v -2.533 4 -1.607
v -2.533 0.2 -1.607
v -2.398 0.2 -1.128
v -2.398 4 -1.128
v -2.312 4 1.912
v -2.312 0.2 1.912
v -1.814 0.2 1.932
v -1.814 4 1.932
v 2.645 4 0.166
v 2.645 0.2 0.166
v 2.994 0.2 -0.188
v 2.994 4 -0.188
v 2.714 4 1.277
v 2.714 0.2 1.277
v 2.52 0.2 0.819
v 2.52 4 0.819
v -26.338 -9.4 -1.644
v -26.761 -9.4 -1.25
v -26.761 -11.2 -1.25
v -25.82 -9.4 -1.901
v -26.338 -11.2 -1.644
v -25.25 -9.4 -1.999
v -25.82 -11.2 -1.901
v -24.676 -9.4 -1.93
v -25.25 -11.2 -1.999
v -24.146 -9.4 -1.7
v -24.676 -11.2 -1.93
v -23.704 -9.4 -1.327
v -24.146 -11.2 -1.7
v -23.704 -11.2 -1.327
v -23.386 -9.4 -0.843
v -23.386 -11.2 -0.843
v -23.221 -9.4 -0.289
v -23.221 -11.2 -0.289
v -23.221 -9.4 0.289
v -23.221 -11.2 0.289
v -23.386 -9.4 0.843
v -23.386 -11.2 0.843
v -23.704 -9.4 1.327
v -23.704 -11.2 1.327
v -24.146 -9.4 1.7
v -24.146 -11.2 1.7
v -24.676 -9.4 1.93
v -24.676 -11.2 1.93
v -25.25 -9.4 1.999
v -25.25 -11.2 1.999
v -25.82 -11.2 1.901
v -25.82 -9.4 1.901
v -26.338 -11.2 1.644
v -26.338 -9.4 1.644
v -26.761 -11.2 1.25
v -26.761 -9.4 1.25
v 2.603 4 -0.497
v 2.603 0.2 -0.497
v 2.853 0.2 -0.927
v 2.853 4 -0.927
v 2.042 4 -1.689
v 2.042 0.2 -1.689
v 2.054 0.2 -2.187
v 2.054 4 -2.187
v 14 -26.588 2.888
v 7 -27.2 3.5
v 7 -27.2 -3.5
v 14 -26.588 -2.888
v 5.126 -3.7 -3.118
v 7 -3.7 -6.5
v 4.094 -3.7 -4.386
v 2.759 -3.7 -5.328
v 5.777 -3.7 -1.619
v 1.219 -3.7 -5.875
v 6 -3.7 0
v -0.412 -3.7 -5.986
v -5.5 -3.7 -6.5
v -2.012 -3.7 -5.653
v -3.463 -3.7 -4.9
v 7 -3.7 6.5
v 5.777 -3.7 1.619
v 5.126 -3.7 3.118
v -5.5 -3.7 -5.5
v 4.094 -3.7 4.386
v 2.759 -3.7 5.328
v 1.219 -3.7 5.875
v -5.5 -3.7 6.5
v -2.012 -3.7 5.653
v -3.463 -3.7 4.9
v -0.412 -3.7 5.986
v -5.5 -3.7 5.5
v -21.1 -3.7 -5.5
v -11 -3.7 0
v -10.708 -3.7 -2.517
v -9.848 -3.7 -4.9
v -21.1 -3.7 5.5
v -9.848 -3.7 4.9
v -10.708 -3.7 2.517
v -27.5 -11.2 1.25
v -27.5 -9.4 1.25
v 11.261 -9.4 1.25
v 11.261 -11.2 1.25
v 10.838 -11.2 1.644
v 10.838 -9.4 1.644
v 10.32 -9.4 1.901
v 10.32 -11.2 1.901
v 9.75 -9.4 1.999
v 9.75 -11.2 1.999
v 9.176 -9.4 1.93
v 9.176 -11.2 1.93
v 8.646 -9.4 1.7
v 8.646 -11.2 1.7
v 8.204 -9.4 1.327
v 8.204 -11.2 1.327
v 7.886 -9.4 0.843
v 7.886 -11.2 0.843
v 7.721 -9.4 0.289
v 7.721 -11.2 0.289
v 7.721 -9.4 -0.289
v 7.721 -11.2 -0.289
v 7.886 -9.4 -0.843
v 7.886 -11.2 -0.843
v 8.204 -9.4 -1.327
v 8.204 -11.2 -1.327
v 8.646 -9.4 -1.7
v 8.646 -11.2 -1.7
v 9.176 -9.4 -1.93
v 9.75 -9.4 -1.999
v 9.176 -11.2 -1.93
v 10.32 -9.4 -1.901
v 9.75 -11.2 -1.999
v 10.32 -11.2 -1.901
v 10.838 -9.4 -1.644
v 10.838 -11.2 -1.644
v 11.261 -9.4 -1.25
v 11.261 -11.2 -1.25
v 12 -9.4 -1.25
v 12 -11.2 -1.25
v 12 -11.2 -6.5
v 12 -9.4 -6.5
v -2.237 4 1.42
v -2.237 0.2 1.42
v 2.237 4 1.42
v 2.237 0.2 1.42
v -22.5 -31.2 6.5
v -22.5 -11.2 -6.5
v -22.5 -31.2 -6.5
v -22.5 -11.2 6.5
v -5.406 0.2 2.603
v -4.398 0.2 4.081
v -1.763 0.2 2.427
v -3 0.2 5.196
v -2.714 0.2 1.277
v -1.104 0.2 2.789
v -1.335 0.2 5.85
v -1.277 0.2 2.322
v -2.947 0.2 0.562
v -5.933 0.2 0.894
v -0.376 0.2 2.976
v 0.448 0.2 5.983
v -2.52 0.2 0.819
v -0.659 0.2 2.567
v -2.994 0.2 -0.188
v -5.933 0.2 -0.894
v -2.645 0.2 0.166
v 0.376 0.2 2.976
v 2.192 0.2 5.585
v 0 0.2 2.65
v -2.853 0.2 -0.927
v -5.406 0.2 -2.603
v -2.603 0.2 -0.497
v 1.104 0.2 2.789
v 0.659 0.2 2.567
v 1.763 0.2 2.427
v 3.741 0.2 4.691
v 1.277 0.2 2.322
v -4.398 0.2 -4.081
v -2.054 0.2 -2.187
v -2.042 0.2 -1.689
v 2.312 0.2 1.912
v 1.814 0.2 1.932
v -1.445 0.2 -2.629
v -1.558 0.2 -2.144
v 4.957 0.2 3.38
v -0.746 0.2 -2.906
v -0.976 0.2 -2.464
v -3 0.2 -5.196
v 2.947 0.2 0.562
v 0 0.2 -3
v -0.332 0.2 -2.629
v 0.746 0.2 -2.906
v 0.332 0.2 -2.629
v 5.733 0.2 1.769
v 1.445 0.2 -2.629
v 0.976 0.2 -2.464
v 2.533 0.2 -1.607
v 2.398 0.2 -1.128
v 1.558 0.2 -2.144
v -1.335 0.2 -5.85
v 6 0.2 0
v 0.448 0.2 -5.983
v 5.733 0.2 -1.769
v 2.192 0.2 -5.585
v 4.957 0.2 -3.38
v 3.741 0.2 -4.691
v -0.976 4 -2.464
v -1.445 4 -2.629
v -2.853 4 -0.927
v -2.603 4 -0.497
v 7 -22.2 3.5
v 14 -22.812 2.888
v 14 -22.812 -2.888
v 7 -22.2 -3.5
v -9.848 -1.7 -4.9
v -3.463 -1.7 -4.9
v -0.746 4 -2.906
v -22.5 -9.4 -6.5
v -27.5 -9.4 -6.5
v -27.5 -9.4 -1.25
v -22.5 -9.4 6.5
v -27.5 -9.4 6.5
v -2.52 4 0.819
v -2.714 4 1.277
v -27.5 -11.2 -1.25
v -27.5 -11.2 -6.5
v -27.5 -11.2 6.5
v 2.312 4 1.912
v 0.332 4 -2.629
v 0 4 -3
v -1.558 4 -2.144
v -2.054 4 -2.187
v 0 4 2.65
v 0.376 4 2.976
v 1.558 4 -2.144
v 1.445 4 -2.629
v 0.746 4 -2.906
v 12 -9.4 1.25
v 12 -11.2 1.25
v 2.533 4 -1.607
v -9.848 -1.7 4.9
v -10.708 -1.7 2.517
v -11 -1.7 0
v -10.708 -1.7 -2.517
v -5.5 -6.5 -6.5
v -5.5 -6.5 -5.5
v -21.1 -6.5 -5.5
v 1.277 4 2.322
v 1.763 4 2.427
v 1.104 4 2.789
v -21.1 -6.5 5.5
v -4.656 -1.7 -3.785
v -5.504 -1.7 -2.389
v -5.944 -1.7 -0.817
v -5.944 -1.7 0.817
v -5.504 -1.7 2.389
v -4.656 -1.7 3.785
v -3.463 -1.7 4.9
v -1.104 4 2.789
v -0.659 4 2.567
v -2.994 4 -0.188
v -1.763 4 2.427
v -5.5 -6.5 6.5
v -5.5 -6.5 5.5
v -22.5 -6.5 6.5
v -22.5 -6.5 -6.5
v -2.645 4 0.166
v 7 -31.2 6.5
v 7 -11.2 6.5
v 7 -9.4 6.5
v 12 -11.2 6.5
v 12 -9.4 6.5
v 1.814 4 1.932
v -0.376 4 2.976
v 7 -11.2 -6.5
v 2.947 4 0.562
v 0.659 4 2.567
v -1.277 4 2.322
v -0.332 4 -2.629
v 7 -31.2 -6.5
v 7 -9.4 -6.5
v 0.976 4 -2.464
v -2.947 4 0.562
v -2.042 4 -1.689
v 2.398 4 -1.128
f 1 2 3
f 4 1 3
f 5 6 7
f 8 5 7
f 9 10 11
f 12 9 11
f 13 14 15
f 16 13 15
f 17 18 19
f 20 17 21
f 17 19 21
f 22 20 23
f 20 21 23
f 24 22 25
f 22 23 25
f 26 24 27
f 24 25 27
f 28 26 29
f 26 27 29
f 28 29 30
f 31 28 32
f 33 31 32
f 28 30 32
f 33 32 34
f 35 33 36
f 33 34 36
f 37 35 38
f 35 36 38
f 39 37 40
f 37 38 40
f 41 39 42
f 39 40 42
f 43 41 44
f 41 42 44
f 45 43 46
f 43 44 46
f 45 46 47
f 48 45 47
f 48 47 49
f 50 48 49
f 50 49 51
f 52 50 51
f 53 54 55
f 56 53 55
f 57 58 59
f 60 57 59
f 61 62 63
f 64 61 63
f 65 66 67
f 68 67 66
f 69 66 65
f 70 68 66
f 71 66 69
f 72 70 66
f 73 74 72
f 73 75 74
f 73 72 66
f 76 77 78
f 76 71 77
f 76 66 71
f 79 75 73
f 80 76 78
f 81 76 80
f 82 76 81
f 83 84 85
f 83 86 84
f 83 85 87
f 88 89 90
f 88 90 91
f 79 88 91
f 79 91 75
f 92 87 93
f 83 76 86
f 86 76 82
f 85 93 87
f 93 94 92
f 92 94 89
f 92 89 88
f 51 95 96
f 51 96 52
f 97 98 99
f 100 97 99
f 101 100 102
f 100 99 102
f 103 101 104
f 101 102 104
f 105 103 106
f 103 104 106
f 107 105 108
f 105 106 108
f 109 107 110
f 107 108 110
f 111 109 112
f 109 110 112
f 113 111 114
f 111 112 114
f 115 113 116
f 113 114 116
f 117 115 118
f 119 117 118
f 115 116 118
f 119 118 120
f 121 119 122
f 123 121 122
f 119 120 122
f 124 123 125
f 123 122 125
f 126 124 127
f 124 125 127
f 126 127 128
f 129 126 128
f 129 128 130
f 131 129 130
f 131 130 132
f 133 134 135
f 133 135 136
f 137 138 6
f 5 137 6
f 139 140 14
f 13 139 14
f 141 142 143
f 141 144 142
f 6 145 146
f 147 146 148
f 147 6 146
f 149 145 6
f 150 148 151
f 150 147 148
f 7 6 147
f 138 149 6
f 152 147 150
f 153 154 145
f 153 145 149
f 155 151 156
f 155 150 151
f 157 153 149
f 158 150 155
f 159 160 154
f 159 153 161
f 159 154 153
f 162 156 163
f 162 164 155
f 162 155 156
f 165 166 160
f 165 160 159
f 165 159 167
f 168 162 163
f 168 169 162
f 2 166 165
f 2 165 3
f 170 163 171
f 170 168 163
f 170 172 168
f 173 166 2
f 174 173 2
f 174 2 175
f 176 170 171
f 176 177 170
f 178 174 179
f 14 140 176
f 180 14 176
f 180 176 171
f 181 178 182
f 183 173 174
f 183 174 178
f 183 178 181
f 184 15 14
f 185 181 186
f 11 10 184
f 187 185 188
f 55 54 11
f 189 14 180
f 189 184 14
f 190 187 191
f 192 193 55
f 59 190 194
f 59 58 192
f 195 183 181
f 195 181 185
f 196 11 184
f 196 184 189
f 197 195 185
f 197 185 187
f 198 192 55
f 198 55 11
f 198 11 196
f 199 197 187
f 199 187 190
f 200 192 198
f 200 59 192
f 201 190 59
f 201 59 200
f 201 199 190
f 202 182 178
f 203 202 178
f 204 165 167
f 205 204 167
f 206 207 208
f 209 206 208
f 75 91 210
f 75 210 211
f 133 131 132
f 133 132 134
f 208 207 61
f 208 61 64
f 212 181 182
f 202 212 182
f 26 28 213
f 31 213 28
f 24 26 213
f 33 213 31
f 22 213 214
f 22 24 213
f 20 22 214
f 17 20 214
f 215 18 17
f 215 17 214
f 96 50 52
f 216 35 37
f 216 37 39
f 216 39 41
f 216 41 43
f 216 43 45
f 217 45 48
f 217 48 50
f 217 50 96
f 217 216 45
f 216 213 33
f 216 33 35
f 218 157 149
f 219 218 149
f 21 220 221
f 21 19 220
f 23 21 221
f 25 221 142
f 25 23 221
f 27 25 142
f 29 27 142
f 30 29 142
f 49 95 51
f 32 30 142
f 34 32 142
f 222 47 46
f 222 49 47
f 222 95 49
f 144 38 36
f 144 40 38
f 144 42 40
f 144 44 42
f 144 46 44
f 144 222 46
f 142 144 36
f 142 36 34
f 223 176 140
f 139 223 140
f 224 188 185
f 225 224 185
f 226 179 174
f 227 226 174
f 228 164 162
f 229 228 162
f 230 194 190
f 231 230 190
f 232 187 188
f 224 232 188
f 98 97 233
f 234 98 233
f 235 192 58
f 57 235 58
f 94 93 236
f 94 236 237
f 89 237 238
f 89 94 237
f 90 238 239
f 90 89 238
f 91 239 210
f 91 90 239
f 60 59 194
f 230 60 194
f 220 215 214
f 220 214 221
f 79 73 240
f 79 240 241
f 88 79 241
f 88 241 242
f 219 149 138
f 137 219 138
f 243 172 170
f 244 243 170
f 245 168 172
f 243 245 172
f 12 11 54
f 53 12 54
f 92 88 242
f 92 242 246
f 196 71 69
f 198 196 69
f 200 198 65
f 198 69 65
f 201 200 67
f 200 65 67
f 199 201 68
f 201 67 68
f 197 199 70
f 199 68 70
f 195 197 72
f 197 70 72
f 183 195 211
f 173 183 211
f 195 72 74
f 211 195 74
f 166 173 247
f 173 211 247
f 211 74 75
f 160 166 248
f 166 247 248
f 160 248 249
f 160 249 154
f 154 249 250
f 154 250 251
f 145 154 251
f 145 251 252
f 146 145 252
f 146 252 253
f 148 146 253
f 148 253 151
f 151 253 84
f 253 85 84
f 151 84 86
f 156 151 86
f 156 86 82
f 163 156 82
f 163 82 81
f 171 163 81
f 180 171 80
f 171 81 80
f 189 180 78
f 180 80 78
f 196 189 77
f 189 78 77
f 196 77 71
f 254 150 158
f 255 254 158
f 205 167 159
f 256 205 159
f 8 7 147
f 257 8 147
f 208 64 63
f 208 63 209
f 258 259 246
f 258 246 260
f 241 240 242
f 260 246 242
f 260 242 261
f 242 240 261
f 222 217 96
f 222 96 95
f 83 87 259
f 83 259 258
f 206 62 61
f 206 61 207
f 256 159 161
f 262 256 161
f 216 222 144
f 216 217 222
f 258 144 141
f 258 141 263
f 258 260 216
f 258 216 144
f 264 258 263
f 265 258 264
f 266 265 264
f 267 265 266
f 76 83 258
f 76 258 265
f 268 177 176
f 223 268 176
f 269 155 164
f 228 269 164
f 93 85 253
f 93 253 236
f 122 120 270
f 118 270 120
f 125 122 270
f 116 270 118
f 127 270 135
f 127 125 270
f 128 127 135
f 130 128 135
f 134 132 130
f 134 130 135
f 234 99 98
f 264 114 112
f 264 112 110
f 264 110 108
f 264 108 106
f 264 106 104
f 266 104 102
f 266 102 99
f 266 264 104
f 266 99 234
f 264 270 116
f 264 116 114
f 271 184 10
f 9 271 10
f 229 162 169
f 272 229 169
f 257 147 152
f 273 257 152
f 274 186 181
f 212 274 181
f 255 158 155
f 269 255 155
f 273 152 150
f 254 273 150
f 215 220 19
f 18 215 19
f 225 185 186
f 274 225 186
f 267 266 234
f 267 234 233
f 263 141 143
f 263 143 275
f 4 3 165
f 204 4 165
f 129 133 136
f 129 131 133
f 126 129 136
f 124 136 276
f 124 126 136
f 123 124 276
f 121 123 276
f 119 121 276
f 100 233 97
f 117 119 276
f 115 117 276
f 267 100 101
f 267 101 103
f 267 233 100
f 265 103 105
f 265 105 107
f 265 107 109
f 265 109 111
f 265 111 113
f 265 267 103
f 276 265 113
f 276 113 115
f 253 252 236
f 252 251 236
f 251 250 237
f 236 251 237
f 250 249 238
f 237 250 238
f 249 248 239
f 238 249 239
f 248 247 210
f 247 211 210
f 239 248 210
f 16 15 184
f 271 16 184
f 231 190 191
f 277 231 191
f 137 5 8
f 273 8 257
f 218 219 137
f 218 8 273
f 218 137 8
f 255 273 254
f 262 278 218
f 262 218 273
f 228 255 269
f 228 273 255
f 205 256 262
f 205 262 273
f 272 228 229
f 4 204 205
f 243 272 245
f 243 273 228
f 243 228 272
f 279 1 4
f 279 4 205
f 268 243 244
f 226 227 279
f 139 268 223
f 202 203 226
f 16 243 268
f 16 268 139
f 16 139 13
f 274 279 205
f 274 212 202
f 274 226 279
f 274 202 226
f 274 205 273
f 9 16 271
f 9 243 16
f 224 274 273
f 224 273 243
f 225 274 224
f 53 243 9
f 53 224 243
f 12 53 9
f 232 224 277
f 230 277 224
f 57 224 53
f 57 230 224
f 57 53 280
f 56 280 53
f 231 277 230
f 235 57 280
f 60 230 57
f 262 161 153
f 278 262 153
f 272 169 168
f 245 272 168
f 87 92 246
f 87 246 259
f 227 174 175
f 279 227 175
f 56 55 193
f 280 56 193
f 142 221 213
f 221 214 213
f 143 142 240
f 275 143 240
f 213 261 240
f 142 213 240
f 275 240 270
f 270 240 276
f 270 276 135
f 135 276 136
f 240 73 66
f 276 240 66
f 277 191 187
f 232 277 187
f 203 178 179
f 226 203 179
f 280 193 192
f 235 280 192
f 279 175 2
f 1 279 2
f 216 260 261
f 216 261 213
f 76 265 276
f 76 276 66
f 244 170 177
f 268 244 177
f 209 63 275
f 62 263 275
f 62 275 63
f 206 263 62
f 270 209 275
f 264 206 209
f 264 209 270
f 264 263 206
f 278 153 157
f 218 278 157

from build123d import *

# Parameters (mm, degrees)
BOSS_EXTRU_1_DEPTH            = 6.5
BOSS_EXTRU_1_DEPTH_BACK       = 6.5
ENL_V_MAT_EXTRU_1_DEPTH       = 2.8
ESQUISSE3_R                   = 6
BOSS_EXTRU_2_DEPTH            = 3.9
BOSS_EXTRU_3_DEPTH            = 3.8
BOSS_EXTRU_4_DEPTH            = 2
DIAM_TRE_DU_PER_AGE_4_0_4_1_D = 4
DIAM_TRE_DU_PER_AGE_4_0_4_2_D = 4
ESQUISSE10_W                  = 7
ESQUISSE10_H                  = 5
BOSS_EXTRU_5_DEPTH            = 7
D_POUILLE1_ANGLE              = 5
ESQUISSE11_W                  = 2
ESQUISSE11_H                  = 2.5
ENL_V_MAT_EXTRU_2_DEPTH       = 36.689494253
ENL_V_MAT_EXTRU_3_REACH       = 37.689
ESQUISSE12_W                  = 2
ESQUISSE12_H                  = 2.5


with BuildPart() as part:
    # Esquisse1 → Boss.-Extru.1 (new, two sides: drawn at the far end of the back side and taken through both)
    with BuildSketch(Plane.XY.offset(-BOSS_EXTRU_1_DEPTH_BACK)):
        Polygon((-22.5, -11.2), (-22.5, -31.2), (7, -31.2), (7, -11.2), (12, -11.2), (12, -9.4), (7, -9.4), (7, -3.7), (-22.5, -3.7), (-22.5, -9.4), (-27.5, -9.4), (-27.5, -11.2), align=None)
    extrude(amount=BOSS_EXTRU_1_DEPTH + BOSS_EXTRU_1_DEPTH_BACK)

    # Esquisse2 → Enlèv. mat.-Extru.1 (cut)
    with BuildSketch(Plane(origin=(0, -3.7, 0), x_dir=(1, 0, 0), z_dir=(0, 1, 0))):
        Polygon((-5.5, 6.5), (-5.5, 5.5), (-21.1, 5.5), (-21.1, -5.5), (-5.5, -5.5), (-5.5, -6.5), (-22.5, -6.5), (-22.5, 6.5), align=None)
    extrude(amount=-ENL_V_MAT_EXTRU_1_DEPTH, mode=Mode.SUBTRACT)

    # Esquisse3 → Boss.-Extru.2 (add)
    with BuildSketch(Plane(origin=(0, -3.7, 0), x_dir=(1, 0, 0), z_dir=(0, 1, 0))):
        Circle(ESQUISSE3_R)
    extrude(amount=BOSS_EXTRU_2_DEPTH)

    # Esquisse4 → Boss.-Extru.3 (add)
    with BuildSketch(Plane(origin=(0, 0.2, 0), x_dir=(1, 0, 0), z_dir=(0, 1, 0))):
        Polygon((0.332133069, 2.629103958), (0, 3), (-0.332133069, 2.629103958), (-0.746069661, 2.905749483), (-0.975530065, 2.463907688), (-1.445261022, 2.62892004), (-1.557630919, 2.143895035), (-2.053641318, 2.186905882), (-2.041860093, 1.689173573), (-2.532983777, 1.607480385), (-2.397791689, 1.128315123), (-2.853169549, 0.927050983), (-2.603061214, 0.496560484), (-2.994080185, 0.188371559), (-2.64477083, -0.166394877), (-2.946861752, -0.562143944), (-2.520299768, -0.818895035), (-2.714481157, -1.277337875), (-2.237469003, -1.419941007), (-2.311539728, -1.912271969), (-1.814049831, -1.931766863), (-1.763355757, -2.427050983), (-1.276647236, -2.322212702), (-1.104373658, -2.789329458), (-0.659028201, -2.566745377), (-0.375999701, -2.976344104), (0, -2.65), (0.375999701, -2.976344104), (0.659028201, -2.566745377), (1.104373658, -2.789329458), (1.276647236, -2.322212702), (1.763355757, -2.427050983), (1.814049831, -1.931766863), (2.311539728, -1.912271969), (2.237469003, -1.419941007), (2.714481157, -1.277337875), (2.520299768, -0.818895035), (2.946861752, -0.562143944), (2.64477083, -0.166394877), (2.994080185, 0.188371559), (2.603061214, 0.496560484), (2.853169549, 0.927050983), (2.397791689, 1.128315123), (2.532983777, 1.607480385), (2.041860093, 1.689173573), (2.053641318, 2.186905882), (1.557630919, 2.143895035), (1.445261022, 2.62892004), (0.975530065, 2.463907688), (0.746069661, 2.905749483), align=None)
    extrude(amount=BOSS_EXTRU_3_DEPTH)

    # Esquisse5 → Boss.-Extru.4 (add)
    with BuildSketch(Plane(origin=(0, -3.7, 0), x_dir=(1, 0, 0), z_dir=(0, 1, 0))):
        with BuildLine():
            Line((-9.848350116, 4.9), (0, 4.9))
            Line((0, 4.9), (0, -4.9))
            Line((0, -4.9), (-9.848350116, -4.9))
            ThreePointArc((-9.848350116, -4.9), (-11, 0), (-9.848350116, 4.9))
        make_face()
    extrude(amount=BOSS_EXTRU_4_DEPTH)

    # Diamètre du perçage Ø4.0 (4)1 (through all)
    with Locations(Plane(origin=(0, -9.4, 0), x_dir=(1, 0, 0), z_dir=(0, 1, 0))):
        with Locations((-25.2, 0)):
            Hole(DIAM_TRE_DU_PER_AGE_4_0_4_1_D / 2)

    # Diamètre du perçage Ø4.0 (4)2 (through all)
    with Locations(Plane(origin=(0, -9.4, 0), x_dir=(1, 0, 0), z_dir=(0, 1, 0))):
        with Locations((9.7, 0)):
            Hole(DIAM_TRE_DU_PER_AGE_4_0_4_2_D / 2)

    # Esquisse10 → Boss.-Extru.5 (add)
    with BuildSketch(Plane(origin=(7, 0, 0), x_dir=(0, 0, -1), z_dir=(1, 0, 0))):
        with Locations((0, -24.7)):
            Rectangle(ESQUISSE10_W, ESQUISSE10_H)
    extrude(amount=BOSS_EXTRU_5_DEPTH)

    # Dépouille1
    d_pouille1_faces = [part.faces().sort_by_distance(p)[0] for p in [
        (10.5, -27.2, 0),
        (10.5, -24.7, -3.5),
        (10.5, -22.2, 0),
        (10.5, -24.7, 3.5),
    ]]
    draft(d_pouille1_faces, Plane(origin=(7, -11.2, -6.5), x_dir=(0, 1, 0), z_dir=(1, 0, 0)), D_POUILLE1_ANGLE)

    # Esquisse11 → Enlèv. mat.-Extru.2 (cut, through all)
    with BuildSketch(Plane(origin=(0, -9.4, 0), x_dir=(1, 0, 0), z_dir=(0, 1, 0))):
        with Locations((-26.5, 0)):
            Rectangle(ESQUISSE11_W, ESQUISSE11_H)
    extrude(amount=-ENL_V_MAT_EXTRU_2_DEPTH, mode=Mode.SUBTRACT)

    # Esquisse12 → Enlèv. mat.-Extru.3 (cut, up to next)
    with BuildSketch(Plane(origin=(0, -9.4, 0), x_dir=(1, 0, 0), z_dir=(0, 1, 0)), mode=Mode.PRIVATE) as enl_v_mat_extru_3_sk1:
        with Locations((11, 0)):
            Rectangle(ESQUISSE12_W, ESQUISSE12_H)
    enl_v_mat_extru_3_tool1 = extrude(enl_v_mat_extru_3_sk1.sketch, amount=-ENL_V_MAT_EXTRU_3_REACH, mode=Mode.PRIVATE) & part.part
    add(enl_v_mat_extru_3_tool1.solids().sort_by_distance((11, -9.4, 0))[0], mode=Mode.SUBTRACT)


solid = part.part
